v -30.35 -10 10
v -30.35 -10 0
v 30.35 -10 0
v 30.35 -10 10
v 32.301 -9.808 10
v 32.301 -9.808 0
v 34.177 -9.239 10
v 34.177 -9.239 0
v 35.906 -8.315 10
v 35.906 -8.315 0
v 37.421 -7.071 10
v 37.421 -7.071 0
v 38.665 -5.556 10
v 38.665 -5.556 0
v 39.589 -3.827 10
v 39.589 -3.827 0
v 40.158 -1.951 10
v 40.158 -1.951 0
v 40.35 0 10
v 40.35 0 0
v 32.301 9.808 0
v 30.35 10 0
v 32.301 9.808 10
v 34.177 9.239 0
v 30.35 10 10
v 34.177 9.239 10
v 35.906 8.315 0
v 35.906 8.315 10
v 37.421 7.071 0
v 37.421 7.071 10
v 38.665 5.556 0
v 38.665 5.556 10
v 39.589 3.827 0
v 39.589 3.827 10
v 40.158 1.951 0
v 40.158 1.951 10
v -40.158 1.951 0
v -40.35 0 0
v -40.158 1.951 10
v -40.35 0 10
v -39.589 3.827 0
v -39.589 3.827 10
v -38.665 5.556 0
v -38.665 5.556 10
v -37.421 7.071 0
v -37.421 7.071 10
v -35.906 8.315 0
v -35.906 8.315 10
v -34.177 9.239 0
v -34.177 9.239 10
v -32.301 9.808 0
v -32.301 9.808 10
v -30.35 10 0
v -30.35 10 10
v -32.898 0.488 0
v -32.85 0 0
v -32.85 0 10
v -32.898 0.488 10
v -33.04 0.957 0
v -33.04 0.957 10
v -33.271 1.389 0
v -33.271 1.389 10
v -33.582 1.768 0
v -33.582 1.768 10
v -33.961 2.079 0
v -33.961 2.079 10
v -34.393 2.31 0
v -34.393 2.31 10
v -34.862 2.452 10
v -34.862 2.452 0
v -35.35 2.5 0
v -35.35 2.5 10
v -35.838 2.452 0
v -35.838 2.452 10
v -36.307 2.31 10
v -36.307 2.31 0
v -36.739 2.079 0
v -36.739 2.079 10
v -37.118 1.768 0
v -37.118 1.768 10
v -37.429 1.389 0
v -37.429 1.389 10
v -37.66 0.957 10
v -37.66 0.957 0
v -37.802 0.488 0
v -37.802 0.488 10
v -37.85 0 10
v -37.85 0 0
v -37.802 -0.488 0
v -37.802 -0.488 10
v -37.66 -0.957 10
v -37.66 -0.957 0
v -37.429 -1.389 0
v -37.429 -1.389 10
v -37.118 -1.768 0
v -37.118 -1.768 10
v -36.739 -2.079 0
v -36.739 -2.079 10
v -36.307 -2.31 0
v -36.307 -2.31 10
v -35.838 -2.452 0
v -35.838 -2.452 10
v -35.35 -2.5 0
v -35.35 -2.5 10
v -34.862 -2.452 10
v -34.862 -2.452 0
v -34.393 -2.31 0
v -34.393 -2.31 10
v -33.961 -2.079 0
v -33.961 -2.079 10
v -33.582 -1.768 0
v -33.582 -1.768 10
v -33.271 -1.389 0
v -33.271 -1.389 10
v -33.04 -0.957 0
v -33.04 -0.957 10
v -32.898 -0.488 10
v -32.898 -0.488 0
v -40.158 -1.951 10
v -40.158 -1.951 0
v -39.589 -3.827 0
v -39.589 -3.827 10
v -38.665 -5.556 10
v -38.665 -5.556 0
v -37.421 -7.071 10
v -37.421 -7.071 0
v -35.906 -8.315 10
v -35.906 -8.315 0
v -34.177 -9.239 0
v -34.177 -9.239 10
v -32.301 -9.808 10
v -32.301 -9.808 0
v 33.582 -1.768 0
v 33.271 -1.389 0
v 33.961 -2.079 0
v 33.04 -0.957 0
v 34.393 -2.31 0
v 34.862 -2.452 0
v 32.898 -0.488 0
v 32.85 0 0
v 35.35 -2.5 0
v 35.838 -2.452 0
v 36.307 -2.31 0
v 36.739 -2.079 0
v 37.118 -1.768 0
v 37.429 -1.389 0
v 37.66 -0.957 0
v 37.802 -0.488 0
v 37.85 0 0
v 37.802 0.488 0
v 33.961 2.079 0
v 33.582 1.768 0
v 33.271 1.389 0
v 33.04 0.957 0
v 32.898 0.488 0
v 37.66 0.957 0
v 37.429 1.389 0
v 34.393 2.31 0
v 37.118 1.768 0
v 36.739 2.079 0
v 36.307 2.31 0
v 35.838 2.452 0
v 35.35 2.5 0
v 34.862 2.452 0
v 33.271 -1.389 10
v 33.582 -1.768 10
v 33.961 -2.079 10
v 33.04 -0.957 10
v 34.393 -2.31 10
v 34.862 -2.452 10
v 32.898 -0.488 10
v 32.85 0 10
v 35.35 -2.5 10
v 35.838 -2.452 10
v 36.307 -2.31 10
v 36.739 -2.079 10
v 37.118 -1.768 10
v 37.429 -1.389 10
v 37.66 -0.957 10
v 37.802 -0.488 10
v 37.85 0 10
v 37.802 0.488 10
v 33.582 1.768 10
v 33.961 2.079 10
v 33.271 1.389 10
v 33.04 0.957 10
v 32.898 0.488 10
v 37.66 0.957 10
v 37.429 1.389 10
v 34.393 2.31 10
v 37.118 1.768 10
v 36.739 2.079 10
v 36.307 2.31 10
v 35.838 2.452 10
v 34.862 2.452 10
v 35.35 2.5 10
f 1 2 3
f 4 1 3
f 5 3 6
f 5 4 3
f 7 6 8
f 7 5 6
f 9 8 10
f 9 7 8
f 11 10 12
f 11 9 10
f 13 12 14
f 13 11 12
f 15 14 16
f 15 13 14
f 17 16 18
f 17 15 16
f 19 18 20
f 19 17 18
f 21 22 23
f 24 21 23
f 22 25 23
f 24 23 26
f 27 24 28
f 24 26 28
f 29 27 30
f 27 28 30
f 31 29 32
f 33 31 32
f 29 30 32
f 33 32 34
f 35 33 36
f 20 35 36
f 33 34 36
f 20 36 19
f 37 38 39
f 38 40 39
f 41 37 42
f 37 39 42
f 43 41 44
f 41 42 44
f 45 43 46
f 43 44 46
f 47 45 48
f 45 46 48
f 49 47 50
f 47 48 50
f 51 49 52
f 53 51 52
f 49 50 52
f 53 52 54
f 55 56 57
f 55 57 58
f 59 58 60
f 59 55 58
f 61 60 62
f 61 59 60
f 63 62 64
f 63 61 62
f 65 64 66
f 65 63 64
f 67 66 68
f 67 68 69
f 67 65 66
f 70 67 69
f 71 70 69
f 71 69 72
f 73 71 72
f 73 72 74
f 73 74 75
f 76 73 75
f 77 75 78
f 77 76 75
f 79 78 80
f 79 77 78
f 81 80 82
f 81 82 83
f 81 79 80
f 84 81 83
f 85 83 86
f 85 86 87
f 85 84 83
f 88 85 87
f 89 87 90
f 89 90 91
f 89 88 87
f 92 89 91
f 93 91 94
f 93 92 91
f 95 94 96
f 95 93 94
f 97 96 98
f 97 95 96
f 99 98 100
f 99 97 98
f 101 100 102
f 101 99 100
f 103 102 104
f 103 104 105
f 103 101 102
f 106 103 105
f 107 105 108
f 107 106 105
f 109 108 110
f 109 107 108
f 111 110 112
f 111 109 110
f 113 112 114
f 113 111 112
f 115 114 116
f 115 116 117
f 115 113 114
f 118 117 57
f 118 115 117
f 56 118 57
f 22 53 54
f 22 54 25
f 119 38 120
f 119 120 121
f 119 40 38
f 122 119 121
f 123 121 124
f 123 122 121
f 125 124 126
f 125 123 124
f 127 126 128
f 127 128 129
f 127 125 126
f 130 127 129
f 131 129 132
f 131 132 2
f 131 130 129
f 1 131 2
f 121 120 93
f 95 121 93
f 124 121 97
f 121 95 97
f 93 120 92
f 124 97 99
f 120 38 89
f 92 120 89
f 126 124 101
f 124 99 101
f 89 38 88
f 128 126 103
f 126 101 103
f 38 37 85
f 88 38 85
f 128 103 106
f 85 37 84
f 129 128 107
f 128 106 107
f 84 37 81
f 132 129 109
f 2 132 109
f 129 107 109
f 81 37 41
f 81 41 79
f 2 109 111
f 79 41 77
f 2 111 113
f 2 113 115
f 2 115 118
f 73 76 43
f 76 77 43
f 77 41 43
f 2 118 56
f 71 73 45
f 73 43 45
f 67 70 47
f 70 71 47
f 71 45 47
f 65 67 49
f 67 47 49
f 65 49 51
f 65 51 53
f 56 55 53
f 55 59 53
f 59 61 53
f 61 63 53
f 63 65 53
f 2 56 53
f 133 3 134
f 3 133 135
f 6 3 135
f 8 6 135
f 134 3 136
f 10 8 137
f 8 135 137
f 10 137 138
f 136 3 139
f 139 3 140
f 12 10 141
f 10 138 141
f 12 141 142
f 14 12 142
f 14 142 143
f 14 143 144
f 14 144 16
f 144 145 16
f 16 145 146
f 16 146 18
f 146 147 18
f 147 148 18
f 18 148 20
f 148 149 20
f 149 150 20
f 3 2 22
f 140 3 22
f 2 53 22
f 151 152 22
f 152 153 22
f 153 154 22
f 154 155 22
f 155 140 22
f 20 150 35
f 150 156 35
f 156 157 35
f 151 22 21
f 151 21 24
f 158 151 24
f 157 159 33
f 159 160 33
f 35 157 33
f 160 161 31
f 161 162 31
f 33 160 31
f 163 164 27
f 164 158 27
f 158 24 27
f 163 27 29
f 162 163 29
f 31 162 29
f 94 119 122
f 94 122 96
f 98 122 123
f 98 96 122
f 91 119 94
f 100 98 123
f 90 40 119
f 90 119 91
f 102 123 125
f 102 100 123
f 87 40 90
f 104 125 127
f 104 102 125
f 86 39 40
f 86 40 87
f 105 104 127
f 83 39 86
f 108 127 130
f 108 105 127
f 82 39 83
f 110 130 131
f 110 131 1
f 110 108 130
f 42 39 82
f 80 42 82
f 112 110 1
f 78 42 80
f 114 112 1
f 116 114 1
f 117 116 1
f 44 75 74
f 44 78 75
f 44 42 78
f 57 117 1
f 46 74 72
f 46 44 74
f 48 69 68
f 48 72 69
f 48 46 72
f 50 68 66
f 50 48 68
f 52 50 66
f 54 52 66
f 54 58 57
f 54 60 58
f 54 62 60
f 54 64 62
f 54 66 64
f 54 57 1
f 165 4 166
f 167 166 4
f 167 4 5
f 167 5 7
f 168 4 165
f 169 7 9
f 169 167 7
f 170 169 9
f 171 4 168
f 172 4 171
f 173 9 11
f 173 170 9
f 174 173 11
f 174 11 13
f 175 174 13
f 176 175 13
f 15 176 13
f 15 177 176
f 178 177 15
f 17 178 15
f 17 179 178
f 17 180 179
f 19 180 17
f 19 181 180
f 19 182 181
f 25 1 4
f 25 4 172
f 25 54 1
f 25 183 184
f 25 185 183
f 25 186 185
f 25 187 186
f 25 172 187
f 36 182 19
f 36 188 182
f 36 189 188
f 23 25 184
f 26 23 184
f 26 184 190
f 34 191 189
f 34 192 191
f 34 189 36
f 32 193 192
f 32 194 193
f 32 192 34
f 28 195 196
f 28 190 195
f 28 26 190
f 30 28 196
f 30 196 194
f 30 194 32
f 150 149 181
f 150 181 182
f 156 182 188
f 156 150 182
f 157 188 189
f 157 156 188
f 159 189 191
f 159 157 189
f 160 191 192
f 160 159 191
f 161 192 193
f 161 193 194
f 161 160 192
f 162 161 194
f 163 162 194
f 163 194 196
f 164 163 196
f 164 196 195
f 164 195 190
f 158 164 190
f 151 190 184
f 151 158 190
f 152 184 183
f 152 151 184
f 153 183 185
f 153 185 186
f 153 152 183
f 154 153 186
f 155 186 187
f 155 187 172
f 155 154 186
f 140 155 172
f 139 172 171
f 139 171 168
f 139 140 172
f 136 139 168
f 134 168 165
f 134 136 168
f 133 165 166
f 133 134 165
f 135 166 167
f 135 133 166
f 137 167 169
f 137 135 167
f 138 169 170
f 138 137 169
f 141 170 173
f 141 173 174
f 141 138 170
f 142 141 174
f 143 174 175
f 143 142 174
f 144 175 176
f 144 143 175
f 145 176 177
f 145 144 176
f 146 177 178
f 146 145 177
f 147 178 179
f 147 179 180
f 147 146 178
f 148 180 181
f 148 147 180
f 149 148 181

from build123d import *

# Parameters (mm, degrees)
SKETCH1_W           = 80.7
SKETCH1_H           = 20
SKETCH1_R           = 2.5
BOSS_EXTRUDE1_DEPTH = 10
FILLET1_R           = 10


with BuildPart() as part:
    # Sketch1 → Boss-Extrude1 (new body)
    with BuildSketch(Plane.XY):
        Rectangle(SKETCH1_W, SKETCH1_H)
        with Locations((-35.35, 0)):
            Circle(SKETCH1_R, mode=Mode.SUBTRACT)
        with Locations((35.35, 0)):
            Circle(SKETCH1_R, mode=Mode.SUBTRACT)
    extrude(amount=BOSS_EXTRUDE1_DEPTH)

    # Fillet1
    fillet1_edges = [part.edges().sort_by_distance(p)[0] for p in [
        (40.35, -10, 5),
        (40.35, 10, 5),
        (-40.35, -10, 5),
        (-40.35, 10, 5),
    ]]
    fillet(fillet1_edges, radius=FILLET1_R - 0.0001)  # a hair under: the kernel refuses the full size


solid = part.part
